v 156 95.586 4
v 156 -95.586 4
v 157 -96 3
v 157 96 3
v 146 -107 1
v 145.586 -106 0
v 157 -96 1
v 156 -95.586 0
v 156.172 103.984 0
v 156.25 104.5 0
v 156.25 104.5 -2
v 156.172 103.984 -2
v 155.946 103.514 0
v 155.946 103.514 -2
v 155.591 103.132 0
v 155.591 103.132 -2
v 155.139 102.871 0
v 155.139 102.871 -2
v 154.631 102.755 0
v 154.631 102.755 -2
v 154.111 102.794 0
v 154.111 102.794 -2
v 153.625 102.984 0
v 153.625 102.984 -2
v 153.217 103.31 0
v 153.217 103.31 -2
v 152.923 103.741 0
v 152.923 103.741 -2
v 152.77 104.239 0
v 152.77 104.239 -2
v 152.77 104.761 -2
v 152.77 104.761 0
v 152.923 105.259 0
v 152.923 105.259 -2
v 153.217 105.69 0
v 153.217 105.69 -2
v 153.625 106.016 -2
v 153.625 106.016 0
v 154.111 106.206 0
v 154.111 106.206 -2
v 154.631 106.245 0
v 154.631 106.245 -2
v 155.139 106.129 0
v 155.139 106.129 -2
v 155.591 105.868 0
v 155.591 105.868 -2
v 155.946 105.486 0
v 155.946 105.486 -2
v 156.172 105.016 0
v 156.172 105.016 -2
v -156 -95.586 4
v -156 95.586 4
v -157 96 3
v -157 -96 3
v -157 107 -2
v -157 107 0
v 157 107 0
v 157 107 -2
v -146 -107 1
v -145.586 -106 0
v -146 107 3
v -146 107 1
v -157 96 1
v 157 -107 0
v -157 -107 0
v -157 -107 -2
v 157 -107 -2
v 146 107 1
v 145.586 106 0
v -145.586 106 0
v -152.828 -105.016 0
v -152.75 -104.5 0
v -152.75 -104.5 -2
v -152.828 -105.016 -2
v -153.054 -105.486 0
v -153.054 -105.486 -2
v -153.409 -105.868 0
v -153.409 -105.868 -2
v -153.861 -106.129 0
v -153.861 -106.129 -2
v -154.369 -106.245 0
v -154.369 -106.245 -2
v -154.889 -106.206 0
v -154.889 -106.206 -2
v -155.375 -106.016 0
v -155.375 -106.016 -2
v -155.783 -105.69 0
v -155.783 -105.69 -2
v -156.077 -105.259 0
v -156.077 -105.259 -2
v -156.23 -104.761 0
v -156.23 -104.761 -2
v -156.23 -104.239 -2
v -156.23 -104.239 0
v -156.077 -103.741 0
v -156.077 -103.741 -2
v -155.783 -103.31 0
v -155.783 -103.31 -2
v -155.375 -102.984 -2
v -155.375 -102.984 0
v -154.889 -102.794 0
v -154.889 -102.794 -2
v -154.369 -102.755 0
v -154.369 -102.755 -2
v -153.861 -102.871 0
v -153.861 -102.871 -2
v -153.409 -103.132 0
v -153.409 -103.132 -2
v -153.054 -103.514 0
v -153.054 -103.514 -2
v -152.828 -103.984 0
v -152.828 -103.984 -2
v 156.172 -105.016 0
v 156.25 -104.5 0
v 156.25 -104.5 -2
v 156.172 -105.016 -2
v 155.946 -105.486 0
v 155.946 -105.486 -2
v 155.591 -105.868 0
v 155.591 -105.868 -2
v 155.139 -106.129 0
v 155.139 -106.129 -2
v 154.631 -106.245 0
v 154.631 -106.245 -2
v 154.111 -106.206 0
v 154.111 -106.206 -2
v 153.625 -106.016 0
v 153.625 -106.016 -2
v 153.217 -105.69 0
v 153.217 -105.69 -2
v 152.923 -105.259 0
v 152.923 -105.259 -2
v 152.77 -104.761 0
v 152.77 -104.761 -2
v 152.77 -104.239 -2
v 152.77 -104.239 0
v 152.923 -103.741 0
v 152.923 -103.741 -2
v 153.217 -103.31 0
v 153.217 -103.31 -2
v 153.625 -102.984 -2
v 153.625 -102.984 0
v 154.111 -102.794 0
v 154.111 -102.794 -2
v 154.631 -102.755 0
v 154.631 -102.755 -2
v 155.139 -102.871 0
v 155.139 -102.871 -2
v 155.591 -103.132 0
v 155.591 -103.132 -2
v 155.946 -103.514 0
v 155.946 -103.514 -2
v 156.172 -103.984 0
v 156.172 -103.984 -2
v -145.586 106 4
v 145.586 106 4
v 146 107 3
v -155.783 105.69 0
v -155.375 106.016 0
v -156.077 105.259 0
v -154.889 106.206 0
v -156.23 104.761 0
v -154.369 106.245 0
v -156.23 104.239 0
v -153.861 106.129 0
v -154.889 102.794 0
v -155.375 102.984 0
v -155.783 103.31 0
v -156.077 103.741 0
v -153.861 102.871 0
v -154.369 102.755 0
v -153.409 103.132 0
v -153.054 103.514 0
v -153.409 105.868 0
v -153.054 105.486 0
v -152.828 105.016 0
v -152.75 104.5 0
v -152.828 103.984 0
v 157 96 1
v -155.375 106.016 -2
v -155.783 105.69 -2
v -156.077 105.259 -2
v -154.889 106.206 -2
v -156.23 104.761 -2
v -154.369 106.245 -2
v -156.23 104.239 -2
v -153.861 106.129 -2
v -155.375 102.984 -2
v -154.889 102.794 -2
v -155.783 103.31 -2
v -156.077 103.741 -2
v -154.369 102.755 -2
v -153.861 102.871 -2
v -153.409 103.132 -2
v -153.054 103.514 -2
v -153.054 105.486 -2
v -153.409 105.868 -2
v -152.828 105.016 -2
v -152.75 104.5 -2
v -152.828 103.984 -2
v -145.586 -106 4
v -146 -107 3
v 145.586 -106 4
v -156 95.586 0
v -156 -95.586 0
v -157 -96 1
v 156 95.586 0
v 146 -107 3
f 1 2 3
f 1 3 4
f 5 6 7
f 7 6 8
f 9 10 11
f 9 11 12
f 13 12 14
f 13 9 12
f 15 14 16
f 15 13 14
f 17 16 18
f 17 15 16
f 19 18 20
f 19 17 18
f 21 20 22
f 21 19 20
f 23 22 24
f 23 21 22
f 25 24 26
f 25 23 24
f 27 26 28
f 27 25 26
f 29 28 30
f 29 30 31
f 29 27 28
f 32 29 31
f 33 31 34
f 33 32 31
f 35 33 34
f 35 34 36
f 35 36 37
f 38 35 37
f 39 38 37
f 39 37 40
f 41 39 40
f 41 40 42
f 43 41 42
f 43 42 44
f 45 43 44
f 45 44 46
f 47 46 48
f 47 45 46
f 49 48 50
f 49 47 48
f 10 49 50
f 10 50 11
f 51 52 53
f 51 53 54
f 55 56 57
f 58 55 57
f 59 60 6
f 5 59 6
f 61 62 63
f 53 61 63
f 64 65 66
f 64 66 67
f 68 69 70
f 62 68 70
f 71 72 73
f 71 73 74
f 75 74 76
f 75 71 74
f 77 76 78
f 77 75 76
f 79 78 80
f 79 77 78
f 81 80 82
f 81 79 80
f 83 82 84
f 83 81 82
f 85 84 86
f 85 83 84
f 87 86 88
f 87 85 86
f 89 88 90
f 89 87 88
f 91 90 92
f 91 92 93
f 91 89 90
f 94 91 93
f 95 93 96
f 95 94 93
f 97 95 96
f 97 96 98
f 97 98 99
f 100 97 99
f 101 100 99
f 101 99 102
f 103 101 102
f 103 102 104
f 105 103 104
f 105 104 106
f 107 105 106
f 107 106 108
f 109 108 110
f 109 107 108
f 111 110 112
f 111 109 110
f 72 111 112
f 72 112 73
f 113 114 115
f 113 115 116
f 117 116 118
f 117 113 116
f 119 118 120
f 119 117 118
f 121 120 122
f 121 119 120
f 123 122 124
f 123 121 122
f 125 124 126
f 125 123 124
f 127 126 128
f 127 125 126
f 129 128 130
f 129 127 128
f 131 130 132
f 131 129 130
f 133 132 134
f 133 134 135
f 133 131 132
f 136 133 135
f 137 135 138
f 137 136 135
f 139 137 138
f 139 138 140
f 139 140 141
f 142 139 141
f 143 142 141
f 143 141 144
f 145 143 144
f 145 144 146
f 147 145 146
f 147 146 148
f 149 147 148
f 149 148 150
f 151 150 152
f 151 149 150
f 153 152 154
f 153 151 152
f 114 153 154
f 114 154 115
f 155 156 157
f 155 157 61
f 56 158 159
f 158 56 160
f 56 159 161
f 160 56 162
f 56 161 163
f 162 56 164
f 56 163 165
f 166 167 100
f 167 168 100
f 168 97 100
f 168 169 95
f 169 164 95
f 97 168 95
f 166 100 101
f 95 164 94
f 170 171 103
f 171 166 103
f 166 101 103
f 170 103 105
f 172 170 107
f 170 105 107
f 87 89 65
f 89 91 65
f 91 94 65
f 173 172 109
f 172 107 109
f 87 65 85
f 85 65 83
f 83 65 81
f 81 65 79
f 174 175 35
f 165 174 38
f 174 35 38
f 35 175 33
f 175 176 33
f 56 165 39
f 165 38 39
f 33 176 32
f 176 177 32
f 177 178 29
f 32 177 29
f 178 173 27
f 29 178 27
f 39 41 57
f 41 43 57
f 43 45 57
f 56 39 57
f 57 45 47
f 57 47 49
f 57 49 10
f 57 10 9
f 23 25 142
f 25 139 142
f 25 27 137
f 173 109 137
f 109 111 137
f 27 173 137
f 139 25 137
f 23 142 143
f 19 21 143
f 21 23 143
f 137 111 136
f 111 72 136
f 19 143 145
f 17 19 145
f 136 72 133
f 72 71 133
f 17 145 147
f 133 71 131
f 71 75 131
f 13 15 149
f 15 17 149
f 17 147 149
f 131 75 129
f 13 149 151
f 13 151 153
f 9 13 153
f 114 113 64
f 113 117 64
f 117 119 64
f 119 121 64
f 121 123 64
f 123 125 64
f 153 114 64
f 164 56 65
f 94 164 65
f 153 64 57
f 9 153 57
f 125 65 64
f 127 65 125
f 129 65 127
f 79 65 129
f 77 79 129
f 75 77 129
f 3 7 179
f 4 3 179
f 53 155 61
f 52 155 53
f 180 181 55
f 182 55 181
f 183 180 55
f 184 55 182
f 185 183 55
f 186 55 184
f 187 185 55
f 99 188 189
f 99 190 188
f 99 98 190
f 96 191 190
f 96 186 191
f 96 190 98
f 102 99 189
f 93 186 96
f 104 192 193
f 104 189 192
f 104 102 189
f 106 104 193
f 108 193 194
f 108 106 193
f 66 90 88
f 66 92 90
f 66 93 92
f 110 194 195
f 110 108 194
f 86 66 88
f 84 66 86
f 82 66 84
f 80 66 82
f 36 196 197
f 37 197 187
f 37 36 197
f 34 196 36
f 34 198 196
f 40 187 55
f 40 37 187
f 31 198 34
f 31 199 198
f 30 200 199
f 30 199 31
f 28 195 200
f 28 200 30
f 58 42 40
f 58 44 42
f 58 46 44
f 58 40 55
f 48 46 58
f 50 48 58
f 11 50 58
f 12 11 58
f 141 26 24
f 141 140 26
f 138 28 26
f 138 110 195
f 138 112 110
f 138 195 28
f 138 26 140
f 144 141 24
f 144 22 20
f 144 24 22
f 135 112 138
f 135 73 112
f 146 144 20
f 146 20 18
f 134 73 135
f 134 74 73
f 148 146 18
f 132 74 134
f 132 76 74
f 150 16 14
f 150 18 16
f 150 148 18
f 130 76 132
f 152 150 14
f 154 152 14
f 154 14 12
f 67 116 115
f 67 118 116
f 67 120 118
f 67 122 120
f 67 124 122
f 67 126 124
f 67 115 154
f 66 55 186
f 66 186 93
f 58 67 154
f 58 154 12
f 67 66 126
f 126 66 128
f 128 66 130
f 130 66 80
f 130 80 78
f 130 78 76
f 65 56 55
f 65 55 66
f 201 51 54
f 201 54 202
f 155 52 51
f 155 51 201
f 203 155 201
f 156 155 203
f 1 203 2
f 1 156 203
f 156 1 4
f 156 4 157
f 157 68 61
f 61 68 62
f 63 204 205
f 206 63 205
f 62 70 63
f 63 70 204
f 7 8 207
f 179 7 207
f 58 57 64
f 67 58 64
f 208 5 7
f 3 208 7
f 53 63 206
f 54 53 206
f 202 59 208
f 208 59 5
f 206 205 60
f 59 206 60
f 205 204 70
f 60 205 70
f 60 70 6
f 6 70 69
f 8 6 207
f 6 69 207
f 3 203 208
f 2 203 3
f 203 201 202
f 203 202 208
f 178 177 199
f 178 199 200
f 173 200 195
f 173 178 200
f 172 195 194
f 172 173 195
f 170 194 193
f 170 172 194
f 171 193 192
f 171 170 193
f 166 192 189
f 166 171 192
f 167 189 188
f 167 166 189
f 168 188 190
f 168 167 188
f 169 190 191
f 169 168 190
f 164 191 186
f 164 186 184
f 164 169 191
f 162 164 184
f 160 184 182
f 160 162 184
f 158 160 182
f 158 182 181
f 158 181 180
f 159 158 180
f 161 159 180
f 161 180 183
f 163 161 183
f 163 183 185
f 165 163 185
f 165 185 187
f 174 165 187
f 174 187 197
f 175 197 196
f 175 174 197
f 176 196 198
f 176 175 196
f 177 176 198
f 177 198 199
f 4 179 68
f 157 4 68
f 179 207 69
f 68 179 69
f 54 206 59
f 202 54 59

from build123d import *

# Parameters (mm, degrees)
F1_DEPTH = 4
F2_W     = 314
F2_H     = 214
F2_R     = 1.75
F3_DEPTH = 2
F4_SIZE  = 1


with BuildPart() as f1:
    # F0 (on Top) → F1 (new body)
    with BuildSketch(Plane.XY):
        Polygon((-146, 107), (-157, 96), (-157, -96), (-146, -107), (146, -107), (157, -96), (157, 96), (146, 107), align=None)
    extrude(amount=F1_DEPTH)

    # F4
    f4_edges = [f1.edges().sort_by_distance(p)[0] for p in [
        (-151.5, 101.5, 4),
        (-157, 0, 4),
        (-151.5, -101.5, 4),
        (0, -107, 4),
        (151.5, -101.5, 4),
        (157, 0, 4),
        (151.5, 101.5, 4),
        (0, 107, 4),
        (-151.5, 101.5, 0),
        (-157, 0, 0),
        (-151.5, -101.5, 0),
        (0, -107, 0),
        (151.5, -101.5, 0),
        (157, 0, 0),
        (151.5, 101.5, 0),
        (0, 107, 0),
    ]]
    chamfer(f4_edges, length=F4_SIZE)


with BuildPart() as f3:
    # F2 (on face) → F3 (new body)
    with BuildSketch(Plane(origin=(0, 0, 0), x_dir=(1, 0, 0), z_dir=(0, 0, -1))):
        Rectangle(F2_W, F2_H)
        with Locations((-154.5, -104.5)):
            Circle(F2_R, mode=Mode.SUBTRACT)
        with Locations((154.5, -104.5)):
            Circle(F2_R, mode=Mode.SUBTRACT)
        with Locations((-154.5, 104.5)):
            Circle(F2_R, mode=Mode.SUBTRACT)
        with Locations((154.5, 104.5)):
            Circle(F2_R, mode=Mode.SUBTRACT)
    extrude(amount=F3_DEPTH)


solid = Compound([f1.part, f3.part])
